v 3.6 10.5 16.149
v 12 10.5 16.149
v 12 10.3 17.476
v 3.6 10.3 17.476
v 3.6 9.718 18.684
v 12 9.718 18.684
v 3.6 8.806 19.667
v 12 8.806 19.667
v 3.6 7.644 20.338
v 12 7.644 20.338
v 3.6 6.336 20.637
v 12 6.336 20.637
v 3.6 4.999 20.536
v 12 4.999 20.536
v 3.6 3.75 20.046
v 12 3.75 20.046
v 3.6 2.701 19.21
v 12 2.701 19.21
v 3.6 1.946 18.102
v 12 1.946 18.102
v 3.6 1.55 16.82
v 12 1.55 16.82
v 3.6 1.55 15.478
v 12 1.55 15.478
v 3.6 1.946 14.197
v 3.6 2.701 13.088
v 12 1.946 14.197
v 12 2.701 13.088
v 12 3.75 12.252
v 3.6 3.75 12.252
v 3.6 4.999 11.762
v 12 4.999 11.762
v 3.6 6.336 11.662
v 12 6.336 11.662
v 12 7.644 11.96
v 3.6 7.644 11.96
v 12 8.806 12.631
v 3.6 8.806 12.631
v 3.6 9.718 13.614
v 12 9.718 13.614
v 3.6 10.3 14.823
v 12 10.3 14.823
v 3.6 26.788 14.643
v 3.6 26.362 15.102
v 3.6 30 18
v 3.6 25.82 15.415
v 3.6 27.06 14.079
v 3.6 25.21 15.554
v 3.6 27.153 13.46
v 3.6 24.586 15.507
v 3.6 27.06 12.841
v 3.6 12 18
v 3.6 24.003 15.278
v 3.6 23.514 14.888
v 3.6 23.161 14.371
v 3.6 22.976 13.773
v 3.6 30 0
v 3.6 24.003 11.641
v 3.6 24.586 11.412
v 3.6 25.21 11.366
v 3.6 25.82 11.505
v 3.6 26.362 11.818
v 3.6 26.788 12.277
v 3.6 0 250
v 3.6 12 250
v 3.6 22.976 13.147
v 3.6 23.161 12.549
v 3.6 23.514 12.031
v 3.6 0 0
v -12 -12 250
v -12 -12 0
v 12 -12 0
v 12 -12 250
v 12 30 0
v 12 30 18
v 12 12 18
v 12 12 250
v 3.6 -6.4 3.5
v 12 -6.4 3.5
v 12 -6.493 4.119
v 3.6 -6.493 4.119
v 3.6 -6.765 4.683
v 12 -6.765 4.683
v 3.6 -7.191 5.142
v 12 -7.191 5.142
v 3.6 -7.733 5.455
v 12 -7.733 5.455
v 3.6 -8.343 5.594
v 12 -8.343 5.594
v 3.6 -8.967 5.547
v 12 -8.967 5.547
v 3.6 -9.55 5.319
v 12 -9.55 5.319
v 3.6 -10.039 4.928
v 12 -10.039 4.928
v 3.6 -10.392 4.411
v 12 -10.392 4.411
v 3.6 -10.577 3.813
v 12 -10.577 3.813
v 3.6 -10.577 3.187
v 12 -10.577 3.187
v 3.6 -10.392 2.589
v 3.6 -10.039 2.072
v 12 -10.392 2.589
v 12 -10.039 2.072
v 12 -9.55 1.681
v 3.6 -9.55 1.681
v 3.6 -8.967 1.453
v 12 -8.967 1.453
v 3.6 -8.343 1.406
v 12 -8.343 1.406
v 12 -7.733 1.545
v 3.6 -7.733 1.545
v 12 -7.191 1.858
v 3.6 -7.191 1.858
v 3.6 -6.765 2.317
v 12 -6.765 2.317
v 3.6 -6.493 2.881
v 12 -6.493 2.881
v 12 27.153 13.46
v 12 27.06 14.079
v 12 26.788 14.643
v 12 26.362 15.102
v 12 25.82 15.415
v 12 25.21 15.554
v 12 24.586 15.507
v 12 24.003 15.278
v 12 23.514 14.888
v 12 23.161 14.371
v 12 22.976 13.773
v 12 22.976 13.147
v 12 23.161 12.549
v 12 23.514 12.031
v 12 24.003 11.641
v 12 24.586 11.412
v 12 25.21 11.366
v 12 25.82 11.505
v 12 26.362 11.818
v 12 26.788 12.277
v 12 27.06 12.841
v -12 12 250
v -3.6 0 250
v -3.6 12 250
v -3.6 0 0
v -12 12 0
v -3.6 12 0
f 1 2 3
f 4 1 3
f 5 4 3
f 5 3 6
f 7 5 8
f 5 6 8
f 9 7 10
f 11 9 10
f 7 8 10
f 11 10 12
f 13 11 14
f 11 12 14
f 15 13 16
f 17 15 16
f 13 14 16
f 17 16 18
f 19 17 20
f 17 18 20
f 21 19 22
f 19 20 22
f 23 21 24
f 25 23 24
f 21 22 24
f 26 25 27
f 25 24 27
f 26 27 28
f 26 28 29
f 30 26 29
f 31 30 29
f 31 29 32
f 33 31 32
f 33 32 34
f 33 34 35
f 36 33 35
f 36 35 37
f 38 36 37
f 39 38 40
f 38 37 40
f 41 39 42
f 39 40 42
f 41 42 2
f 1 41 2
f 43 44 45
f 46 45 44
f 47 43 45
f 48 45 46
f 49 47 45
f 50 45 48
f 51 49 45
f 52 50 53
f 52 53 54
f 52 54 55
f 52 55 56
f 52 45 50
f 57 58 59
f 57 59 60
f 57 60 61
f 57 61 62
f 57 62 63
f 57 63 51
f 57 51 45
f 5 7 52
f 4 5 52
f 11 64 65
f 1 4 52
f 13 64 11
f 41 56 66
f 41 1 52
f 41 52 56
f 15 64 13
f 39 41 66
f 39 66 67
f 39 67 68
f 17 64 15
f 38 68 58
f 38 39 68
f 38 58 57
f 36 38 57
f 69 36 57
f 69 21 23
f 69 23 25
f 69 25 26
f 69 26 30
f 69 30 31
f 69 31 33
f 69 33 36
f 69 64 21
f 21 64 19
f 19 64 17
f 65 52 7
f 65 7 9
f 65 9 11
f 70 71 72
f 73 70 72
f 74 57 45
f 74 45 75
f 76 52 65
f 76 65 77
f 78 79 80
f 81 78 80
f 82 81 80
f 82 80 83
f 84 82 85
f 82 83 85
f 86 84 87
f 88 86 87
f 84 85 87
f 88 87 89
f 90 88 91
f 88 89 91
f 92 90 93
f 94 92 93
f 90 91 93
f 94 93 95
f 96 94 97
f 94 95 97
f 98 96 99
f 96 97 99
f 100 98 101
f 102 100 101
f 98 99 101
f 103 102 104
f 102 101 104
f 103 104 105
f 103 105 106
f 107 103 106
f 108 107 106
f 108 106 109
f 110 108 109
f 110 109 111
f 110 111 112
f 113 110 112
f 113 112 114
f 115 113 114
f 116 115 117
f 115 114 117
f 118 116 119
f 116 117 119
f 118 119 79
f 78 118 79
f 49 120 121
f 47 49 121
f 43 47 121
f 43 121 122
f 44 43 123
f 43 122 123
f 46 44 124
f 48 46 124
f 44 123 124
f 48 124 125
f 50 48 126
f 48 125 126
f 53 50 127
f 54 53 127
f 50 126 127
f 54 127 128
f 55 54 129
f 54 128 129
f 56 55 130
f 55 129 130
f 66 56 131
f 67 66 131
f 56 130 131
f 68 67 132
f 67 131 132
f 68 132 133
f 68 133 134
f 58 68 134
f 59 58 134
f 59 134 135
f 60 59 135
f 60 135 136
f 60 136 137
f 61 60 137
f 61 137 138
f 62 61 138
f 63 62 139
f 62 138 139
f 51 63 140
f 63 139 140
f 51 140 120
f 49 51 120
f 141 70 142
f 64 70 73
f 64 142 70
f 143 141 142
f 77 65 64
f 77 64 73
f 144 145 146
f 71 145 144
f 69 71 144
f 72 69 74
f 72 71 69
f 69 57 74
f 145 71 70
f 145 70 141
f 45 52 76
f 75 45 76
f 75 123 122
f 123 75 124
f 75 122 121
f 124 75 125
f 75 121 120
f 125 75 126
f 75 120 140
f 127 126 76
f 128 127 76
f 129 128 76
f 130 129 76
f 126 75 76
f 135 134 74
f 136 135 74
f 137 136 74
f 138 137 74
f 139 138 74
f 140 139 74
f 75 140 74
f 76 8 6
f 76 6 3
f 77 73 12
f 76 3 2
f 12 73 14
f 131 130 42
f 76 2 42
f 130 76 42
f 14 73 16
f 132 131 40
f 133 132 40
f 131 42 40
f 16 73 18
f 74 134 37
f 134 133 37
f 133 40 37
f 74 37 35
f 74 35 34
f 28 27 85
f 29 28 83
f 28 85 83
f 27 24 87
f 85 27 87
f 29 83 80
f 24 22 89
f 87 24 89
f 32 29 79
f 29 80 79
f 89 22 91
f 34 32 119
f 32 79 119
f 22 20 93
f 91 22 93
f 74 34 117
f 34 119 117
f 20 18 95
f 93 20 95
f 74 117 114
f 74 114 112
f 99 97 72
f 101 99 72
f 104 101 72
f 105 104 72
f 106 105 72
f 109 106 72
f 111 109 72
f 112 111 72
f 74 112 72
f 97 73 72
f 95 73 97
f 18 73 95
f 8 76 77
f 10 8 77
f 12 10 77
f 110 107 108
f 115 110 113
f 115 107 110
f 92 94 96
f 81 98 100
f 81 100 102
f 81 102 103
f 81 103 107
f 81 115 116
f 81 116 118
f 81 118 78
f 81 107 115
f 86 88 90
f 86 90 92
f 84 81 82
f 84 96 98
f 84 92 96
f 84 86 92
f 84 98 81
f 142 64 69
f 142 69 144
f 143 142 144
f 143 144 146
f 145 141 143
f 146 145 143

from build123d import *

# Parameters (mm, degrees)
SKETCH1_W           = 24
SKETCH1_H           = 24
BOSS_EXTRUDE1_DEPTH = 250
SKETCH2_W           = 3.6
SKETCH2_H           = 12
CUT_EXTRUDE1_DEPTH  = 250
SKETCH8_W           = 8.4
SKETCH8_H           = 18
BOSS_EXTRUDE2_DEPTH = 18
SKETCH6_R           = 2.1
SKETCH6_R_2         = 4.5
CUT_EXTRUDE3_DEPTH  = 8.4


with BuildPart() as part:
    # Sketch1 → Boss-Extrude1 (new body)
    with BuildSketch(Plane.XY):
        Rectangle(SKETCH1_W, SKETCH1_H)
    extrude(amount=BOSS_EXTRUDE1_DEPTH)

    # Sketch2 → Cut-Extrude1 (cut)
    with BuildSketch(Plane.XY.offset(250)):
        with Locations((1.8, 6)):
            Rectangle(SKETCH2_W, SKETCH2_H)
    cut_extrude1 = extrude(amount=-CUT_EXTRUDE1_DEPTH, mode=Mode.SUBTRACT)

    # Mirror1: Cut-Extrude1 across plane
    add(cut_extrude1.mirror(Plane(origin=(0, 0, 0), x_dir=(0, 0, 1), z_dir=(1, 0, 0))), mode=Mode.SUBTRACT)

    # Sketch8 → Boss-Extrude2 (add)
    with BuildSketch(Plane(origin=(0, 12, 0), x_dir=(1, 0, 0), z_dir=(0, 1, 0))):
        with Locations((7.8, -9)):
            Rectangle(SKETCH8_W, SKETCH8_H)
    extrude(amount=BOSS_EXTRUDE2_DEPTH)

    # Sketch6 → Cut-Extrude3 (cut)
    with BuildSketch(Plane(origin=(12, 0, 0), x_dir=(0, 0, -1), z_dir=(1, 0, 0))):
        with Locations(Location((-3.5, -8.5, 0), (0, 0, 90))):
            Circle(SKETCH6_R)
        with Locations(Location((-16.149110641, 6, 0), (0, 0, 90))):
            Circle(SKETCH6_R_2)
        with Locations(Location((-13.459703626, 25.053007372, 0), (0, 0, 90))):
            Circle(SKETCH6_R)
    extrude(amount=-CUT_EXTRUDE3_DEPTH, mode=Mode.SUBTRACT)


solid = part.part
